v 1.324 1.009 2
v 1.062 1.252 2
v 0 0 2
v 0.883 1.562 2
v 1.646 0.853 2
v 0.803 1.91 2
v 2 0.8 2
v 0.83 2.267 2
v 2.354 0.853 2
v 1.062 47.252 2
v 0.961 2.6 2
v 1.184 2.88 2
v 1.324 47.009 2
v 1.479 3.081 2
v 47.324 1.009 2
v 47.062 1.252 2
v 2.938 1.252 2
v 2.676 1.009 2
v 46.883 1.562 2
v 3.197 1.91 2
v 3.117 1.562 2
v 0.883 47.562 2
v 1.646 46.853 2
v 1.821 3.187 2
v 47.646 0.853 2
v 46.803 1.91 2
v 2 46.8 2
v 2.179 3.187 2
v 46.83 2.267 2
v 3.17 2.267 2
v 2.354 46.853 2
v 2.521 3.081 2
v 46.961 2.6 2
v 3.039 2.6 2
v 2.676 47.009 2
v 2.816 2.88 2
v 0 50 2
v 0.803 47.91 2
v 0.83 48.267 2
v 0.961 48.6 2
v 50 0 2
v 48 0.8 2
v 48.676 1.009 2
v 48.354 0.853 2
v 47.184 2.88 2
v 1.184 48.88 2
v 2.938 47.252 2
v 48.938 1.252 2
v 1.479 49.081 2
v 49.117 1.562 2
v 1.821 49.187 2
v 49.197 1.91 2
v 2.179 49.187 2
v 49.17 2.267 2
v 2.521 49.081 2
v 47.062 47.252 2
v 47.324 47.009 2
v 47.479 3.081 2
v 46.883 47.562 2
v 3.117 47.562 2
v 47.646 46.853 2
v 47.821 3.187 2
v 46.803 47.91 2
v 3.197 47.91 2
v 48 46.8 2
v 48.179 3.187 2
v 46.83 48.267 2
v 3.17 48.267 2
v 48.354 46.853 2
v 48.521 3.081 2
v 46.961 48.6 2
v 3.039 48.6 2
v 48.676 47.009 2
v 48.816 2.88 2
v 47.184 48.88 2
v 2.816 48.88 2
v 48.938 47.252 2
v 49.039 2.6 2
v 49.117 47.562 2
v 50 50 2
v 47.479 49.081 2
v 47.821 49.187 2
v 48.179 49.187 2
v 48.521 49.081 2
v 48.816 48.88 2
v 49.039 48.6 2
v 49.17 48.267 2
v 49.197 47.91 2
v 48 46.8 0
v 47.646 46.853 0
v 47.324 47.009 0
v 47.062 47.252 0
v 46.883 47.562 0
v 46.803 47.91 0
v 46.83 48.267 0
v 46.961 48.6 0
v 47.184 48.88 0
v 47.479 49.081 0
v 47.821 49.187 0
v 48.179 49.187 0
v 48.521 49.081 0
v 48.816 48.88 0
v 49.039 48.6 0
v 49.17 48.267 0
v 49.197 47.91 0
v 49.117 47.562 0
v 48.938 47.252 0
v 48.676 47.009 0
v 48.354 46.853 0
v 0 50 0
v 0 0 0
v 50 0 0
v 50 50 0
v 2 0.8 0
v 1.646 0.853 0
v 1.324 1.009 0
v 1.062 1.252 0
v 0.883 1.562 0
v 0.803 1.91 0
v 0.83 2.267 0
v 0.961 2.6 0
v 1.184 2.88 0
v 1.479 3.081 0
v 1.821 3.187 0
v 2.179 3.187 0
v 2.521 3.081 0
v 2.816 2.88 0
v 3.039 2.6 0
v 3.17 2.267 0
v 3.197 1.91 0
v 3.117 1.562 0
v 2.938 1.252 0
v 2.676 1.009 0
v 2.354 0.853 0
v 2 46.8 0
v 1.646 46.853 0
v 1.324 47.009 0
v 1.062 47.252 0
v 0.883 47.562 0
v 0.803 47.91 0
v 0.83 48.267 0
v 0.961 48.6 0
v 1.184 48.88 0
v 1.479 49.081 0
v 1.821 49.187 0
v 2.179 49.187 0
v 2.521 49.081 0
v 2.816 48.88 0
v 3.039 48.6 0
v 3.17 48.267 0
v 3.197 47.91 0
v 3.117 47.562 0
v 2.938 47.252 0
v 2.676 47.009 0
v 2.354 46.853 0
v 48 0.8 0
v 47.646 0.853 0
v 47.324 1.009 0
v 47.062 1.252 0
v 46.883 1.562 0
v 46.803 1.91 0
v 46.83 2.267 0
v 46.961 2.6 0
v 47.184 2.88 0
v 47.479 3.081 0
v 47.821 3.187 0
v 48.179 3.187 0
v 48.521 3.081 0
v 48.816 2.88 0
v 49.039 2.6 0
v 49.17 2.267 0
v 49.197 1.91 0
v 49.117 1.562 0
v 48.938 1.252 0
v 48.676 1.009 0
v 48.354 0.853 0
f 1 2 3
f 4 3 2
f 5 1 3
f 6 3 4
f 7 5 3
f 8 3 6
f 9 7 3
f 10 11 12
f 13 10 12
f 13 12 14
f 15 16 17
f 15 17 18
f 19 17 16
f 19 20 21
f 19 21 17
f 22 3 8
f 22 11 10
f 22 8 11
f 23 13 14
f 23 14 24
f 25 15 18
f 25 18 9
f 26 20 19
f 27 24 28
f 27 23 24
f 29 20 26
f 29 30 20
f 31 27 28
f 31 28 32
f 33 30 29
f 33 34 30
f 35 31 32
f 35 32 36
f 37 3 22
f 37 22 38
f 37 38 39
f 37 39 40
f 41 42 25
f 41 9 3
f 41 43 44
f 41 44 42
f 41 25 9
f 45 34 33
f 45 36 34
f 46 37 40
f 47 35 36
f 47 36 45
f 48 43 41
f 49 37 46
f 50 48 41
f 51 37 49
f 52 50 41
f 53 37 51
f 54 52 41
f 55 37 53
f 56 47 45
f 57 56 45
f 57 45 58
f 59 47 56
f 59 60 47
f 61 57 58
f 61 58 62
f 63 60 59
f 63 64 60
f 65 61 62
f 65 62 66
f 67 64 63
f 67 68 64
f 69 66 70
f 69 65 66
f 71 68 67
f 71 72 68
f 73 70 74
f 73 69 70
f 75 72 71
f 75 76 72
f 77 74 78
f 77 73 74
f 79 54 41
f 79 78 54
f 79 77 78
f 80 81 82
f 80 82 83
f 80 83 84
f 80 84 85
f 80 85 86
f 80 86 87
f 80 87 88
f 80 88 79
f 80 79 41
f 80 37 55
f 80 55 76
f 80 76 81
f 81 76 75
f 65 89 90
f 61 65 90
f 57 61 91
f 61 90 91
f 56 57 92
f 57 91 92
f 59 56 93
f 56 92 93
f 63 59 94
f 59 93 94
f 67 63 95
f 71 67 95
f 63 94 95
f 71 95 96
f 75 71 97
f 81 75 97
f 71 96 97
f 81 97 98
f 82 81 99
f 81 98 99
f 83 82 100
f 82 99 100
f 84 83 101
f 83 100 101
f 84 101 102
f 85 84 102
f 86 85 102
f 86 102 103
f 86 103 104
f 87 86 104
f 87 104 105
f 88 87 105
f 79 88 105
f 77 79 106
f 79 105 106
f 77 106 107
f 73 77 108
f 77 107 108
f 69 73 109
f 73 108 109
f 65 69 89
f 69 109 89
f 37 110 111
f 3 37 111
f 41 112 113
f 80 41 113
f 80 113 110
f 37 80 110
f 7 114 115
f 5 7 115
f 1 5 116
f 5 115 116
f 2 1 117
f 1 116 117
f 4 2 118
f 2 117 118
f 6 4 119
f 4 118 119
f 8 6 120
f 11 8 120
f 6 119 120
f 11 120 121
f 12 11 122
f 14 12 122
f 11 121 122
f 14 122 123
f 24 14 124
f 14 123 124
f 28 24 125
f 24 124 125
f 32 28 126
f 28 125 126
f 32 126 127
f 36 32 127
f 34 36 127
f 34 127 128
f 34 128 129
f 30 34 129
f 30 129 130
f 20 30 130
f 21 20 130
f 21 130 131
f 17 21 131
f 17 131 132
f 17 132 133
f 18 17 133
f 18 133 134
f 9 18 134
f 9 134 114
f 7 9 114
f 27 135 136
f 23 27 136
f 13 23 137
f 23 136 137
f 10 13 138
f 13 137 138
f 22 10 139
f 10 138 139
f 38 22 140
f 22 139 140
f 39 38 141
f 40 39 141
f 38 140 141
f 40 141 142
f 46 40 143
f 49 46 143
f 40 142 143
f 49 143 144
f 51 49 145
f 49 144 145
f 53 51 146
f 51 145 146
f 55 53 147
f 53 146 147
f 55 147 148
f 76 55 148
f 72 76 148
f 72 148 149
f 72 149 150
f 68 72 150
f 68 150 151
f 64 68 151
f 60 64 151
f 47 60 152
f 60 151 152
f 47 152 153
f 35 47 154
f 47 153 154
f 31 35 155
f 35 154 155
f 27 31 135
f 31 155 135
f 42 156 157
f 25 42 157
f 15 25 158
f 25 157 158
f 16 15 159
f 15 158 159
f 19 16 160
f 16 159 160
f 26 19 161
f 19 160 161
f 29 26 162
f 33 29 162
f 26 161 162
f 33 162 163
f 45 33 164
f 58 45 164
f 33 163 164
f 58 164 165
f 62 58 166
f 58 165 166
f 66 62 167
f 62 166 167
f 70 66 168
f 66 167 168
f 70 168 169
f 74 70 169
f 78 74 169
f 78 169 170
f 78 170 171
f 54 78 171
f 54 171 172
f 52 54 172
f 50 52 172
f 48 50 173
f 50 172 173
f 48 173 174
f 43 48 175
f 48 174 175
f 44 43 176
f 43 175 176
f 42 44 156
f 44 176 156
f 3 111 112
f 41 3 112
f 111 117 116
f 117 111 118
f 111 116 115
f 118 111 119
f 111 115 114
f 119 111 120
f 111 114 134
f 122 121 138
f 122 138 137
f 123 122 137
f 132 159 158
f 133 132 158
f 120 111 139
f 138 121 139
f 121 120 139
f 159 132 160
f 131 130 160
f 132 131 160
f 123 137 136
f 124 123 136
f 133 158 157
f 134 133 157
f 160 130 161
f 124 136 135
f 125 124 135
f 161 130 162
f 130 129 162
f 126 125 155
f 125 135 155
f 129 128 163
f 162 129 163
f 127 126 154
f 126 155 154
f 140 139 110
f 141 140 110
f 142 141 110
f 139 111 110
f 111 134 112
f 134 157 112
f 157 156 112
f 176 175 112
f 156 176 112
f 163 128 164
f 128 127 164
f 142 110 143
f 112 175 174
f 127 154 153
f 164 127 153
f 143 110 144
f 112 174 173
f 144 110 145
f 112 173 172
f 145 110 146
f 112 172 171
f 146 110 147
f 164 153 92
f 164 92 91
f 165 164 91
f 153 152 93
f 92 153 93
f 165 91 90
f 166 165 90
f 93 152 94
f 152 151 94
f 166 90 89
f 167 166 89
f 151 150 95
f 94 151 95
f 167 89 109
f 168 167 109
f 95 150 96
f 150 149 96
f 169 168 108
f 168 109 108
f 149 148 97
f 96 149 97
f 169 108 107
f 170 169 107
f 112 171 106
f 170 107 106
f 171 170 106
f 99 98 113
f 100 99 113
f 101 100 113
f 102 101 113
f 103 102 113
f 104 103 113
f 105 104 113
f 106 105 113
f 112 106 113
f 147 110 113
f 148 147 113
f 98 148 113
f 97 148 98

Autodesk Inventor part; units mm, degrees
ref_plane "YZ Plane" through (0, 0, 0) normal (1, 0, 0) x (0, 1, 0)
ref_plane "XZ Plane" through (0, 0, 0) normal (0, 1, 0) x (-1, 0, 0)
ref_plane "XY Plane" through (0, 0, 0) normal (0, 0, 1) x (1, 0, 0)
sketch "Skizze1" plane through (0, 0, 0) normal (0, 0, 1) x (1, 0, 0)
  line L0 (0, 0) -> (50, 0)
  line L1 (50, 0) -> (50, 50)
  line L2 (50, 50) -> (0, 50)
  line L3 (0, 50) -> (0, 0)
  dimension "d0" = 50
  dimension "d1" = 50
extrude "Extrusion1" add sketch "Skizze1" along normal blind 2
sketch "Skizze3" plane through (0, 0, 2) normal (0, 0, 1) x (1, 0, 0)
  line L0 (0, 0) -> (0, 50) projected
  line L1 (50, 0) -> (0, 0) projected
  line L2 (50, 50) -> (50, 0) projected
  line L3 (0, 50) -> (50, 50) projected
  line L4 (2, 48) -> (2, 2)
  line L5 (2, 2) -> (48, 2)
  line L6 (48, 2) -> (48, 48)
  line L7 (48, 48) -> (2, 48)
  dimension "d15" = 2
hole "Bohrung2" at (2, 48, 2) at (48, 48, 2) at (48, 2, 2) at (2, 2, 2) direction (0, 0, -1) diameter 2.4 end through all
properties part number "1_0204_004"
